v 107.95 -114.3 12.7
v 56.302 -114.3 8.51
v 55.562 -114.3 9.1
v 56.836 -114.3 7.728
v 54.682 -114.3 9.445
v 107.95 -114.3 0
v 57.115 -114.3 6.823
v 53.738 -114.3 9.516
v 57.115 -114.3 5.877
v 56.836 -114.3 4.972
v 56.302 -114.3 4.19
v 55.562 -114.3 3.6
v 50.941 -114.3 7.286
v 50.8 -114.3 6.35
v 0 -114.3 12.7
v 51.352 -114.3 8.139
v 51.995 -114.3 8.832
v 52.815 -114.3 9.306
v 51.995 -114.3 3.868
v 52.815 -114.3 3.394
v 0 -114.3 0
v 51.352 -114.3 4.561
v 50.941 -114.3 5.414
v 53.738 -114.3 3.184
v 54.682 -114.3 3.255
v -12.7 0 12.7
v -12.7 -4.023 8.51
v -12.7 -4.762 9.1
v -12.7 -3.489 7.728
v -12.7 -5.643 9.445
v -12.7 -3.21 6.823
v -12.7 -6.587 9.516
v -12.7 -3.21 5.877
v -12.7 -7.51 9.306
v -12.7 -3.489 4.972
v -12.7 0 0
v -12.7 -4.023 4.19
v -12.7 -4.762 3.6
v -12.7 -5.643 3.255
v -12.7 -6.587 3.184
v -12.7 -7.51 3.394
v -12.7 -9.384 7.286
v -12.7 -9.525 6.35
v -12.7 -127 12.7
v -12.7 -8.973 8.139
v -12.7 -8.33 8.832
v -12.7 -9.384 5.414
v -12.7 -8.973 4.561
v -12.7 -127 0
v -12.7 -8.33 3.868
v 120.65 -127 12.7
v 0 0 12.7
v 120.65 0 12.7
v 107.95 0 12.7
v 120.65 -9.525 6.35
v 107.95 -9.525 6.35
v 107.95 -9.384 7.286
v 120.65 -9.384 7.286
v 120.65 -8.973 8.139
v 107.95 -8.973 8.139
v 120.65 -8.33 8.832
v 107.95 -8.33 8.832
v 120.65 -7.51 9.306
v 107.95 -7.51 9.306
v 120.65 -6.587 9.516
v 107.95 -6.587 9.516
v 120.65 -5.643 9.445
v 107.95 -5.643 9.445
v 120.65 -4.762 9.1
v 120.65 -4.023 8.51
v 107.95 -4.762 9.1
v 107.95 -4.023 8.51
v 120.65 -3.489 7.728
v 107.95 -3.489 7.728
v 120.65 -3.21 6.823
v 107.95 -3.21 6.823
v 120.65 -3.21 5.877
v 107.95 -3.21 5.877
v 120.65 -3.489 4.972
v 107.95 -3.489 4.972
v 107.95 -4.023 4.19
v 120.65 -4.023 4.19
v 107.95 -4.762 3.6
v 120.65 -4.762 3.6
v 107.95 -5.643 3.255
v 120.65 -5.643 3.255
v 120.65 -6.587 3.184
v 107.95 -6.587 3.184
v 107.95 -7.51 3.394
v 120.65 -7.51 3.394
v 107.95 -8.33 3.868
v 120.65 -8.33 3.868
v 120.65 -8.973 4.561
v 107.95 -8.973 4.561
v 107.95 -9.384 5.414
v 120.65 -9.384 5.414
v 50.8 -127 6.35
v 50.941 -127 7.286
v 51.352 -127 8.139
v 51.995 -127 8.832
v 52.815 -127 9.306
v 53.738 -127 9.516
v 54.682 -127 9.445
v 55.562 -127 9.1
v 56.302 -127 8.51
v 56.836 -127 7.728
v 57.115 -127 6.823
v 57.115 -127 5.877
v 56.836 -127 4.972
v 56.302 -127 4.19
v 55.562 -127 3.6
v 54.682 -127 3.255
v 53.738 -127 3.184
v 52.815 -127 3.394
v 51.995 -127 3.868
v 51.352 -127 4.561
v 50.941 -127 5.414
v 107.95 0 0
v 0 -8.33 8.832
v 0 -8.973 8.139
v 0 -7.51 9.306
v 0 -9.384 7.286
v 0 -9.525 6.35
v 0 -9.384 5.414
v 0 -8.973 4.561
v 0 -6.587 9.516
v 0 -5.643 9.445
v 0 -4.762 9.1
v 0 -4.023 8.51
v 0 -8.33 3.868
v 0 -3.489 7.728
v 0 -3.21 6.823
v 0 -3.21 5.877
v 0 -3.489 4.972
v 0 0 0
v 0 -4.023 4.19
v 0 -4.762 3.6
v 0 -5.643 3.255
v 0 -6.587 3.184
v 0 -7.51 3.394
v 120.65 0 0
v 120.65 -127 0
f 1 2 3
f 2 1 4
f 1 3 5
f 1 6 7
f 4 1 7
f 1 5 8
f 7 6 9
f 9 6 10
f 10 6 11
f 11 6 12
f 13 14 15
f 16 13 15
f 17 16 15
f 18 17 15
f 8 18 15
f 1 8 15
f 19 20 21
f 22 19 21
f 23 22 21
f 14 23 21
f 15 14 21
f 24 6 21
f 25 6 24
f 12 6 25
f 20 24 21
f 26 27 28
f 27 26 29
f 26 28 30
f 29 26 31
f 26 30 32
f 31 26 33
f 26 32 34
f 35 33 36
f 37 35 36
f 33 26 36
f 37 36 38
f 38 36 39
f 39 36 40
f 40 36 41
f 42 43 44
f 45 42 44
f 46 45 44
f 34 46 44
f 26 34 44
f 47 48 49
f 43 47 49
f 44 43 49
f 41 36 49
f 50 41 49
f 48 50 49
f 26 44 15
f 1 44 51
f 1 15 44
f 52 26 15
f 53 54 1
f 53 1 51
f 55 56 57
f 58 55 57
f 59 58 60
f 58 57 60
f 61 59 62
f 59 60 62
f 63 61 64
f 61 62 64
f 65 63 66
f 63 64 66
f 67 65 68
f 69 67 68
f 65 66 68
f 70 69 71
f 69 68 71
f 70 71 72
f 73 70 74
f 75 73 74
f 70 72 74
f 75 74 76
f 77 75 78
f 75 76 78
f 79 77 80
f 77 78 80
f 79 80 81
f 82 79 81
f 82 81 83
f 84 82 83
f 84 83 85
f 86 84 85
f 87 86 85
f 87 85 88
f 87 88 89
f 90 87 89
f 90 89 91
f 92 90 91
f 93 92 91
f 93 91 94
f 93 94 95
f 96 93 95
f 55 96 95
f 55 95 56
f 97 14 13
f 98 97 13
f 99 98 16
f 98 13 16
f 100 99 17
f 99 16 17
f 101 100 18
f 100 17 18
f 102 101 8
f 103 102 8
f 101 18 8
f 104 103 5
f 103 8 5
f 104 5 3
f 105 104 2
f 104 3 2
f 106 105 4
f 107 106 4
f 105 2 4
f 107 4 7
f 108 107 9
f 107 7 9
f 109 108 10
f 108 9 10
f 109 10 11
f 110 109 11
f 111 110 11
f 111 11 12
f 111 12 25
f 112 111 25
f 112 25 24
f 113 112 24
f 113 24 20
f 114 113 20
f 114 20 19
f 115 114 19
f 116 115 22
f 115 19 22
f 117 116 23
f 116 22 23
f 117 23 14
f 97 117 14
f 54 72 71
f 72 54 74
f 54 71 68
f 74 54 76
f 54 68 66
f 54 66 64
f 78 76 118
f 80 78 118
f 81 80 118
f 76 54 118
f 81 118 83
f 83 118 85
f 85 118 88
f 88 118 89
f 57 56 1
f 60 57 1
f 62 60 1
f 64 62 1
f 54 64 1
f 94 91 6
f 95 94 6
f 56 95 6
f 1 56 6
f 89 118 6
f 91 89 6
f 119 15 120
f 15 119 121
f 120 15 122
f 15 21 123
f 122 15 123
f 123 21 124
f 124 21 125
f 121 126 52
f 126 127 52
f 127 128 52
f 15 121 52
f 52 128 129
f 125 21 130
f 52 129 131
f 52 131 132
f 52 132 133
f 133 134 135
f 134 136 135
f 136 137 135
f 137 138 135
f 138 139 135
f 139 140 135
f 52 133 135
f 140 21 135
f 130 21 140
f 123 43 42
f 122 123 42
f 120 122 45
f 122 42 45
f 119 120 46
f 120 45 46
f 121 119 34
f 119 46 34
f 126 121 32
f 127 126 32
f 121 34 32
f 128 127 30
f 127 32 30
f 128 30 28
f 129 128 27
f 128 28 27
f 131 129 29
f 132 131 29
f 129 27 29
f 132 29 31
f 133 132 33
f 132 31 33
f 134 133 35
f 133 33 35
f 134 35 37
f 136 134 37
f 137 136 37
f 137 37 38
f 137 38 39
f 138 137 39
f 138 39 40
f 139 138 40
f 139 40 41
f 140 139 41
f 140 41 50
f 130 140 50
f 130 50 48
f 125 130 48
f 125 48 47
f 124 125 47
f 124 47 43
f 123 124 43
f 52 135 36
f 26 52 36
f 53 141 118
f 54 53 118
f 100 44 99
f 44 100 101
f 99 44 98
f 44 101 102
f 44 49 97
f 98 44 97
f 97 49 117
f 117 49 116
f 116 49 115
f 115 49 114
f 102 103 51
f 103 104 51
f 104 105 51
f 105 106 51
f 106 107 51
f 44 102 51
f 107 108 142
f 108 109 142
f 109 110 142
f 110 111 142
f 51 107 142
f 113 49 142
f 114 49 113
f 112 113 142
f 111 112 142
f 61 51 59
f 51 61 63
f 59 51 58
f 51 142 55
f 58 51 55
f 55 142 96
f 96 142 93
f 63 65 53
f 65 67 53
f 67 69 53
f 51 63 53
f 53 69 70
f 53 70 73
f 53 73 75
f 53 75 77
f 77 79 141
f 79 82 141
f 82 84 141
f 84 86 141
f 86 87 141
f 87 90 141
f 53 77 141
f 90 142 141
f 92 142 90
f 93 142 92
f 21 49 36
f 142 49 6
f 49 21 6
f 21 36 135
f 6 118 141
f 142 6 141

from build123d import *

# Parameters (mm, degrees)
BOSS_EXTRUDE1_DEPTH = 12.7
CUT_EXTRUDE1_REACH  = 186.587
SKETCH2_R           = 3.175
SKETCH3_R           = 3.175
CUT_EXTRUDE2_DEPTH  = 12.7


with BuildPart() as part:
    # Sketch1 → Boss-Extrude1 (new body)
    with BuildSketch(Plane.XY):
        Polygon((0, 0), (-12.7, 0), (-12.7, -127), (120.65, -127), (120.65, 0), (107.95, 0), (107.95, -114.3), (0, -114.3), align=None)
    extrude(amount=BOSS_EXTRUDE1_DEPTH)

    # Cut-Extrude1: up to this face of the body (flat: up to its plane)
    cut_extrude1_end = Plane(part.part.faces().sort_by_distance((120.65, -63.5, 6.35))[0])
    # Sketch2 → Cut-Extrude1 (cut, up to the picked face)
    with BuildSketch(Plane.ZY.offset(12.7), mode=Mode.PRIVATE) as cut_extrude1_sk1:
        with Locations(Location((6.35, -6.35, 0), (0, 0, 270))):
            Circle(SKETCH2_R)
    cut_extrude1_tool1 = split(extrude(cut_extrude1_sk1.sketch, amount=-CUT_EXTRUDE1_REACH, mode=Mode.PRIVATE), bisect_by=cut_extrude1_end, keep=Keep.BOTH, mode=Mode.PRIVATE)
    add(cut_extrude1_tool1.solids().sort_by(Axis((-12.7, -6.35, 6.35), (1, 0, 0)))[0], mode=Mode.SUBTRACT)

    # Sketch3 → Cut-Extrude2 (cut)
    with BuildSketch(Plane(origin=(0, -114.3, 0), x_dir=(1, 0, 0), z_dir=(0, 1, 0))):
        with Locations(Location((53.975, -6.35, 0), (0, 0, 180))):
            Circle(SKETCH3_R)
    extrude(amount=-CUT_EXTRUDE2_DEPTH, mode=Mode.SUBTRACT)


solid = part.part
